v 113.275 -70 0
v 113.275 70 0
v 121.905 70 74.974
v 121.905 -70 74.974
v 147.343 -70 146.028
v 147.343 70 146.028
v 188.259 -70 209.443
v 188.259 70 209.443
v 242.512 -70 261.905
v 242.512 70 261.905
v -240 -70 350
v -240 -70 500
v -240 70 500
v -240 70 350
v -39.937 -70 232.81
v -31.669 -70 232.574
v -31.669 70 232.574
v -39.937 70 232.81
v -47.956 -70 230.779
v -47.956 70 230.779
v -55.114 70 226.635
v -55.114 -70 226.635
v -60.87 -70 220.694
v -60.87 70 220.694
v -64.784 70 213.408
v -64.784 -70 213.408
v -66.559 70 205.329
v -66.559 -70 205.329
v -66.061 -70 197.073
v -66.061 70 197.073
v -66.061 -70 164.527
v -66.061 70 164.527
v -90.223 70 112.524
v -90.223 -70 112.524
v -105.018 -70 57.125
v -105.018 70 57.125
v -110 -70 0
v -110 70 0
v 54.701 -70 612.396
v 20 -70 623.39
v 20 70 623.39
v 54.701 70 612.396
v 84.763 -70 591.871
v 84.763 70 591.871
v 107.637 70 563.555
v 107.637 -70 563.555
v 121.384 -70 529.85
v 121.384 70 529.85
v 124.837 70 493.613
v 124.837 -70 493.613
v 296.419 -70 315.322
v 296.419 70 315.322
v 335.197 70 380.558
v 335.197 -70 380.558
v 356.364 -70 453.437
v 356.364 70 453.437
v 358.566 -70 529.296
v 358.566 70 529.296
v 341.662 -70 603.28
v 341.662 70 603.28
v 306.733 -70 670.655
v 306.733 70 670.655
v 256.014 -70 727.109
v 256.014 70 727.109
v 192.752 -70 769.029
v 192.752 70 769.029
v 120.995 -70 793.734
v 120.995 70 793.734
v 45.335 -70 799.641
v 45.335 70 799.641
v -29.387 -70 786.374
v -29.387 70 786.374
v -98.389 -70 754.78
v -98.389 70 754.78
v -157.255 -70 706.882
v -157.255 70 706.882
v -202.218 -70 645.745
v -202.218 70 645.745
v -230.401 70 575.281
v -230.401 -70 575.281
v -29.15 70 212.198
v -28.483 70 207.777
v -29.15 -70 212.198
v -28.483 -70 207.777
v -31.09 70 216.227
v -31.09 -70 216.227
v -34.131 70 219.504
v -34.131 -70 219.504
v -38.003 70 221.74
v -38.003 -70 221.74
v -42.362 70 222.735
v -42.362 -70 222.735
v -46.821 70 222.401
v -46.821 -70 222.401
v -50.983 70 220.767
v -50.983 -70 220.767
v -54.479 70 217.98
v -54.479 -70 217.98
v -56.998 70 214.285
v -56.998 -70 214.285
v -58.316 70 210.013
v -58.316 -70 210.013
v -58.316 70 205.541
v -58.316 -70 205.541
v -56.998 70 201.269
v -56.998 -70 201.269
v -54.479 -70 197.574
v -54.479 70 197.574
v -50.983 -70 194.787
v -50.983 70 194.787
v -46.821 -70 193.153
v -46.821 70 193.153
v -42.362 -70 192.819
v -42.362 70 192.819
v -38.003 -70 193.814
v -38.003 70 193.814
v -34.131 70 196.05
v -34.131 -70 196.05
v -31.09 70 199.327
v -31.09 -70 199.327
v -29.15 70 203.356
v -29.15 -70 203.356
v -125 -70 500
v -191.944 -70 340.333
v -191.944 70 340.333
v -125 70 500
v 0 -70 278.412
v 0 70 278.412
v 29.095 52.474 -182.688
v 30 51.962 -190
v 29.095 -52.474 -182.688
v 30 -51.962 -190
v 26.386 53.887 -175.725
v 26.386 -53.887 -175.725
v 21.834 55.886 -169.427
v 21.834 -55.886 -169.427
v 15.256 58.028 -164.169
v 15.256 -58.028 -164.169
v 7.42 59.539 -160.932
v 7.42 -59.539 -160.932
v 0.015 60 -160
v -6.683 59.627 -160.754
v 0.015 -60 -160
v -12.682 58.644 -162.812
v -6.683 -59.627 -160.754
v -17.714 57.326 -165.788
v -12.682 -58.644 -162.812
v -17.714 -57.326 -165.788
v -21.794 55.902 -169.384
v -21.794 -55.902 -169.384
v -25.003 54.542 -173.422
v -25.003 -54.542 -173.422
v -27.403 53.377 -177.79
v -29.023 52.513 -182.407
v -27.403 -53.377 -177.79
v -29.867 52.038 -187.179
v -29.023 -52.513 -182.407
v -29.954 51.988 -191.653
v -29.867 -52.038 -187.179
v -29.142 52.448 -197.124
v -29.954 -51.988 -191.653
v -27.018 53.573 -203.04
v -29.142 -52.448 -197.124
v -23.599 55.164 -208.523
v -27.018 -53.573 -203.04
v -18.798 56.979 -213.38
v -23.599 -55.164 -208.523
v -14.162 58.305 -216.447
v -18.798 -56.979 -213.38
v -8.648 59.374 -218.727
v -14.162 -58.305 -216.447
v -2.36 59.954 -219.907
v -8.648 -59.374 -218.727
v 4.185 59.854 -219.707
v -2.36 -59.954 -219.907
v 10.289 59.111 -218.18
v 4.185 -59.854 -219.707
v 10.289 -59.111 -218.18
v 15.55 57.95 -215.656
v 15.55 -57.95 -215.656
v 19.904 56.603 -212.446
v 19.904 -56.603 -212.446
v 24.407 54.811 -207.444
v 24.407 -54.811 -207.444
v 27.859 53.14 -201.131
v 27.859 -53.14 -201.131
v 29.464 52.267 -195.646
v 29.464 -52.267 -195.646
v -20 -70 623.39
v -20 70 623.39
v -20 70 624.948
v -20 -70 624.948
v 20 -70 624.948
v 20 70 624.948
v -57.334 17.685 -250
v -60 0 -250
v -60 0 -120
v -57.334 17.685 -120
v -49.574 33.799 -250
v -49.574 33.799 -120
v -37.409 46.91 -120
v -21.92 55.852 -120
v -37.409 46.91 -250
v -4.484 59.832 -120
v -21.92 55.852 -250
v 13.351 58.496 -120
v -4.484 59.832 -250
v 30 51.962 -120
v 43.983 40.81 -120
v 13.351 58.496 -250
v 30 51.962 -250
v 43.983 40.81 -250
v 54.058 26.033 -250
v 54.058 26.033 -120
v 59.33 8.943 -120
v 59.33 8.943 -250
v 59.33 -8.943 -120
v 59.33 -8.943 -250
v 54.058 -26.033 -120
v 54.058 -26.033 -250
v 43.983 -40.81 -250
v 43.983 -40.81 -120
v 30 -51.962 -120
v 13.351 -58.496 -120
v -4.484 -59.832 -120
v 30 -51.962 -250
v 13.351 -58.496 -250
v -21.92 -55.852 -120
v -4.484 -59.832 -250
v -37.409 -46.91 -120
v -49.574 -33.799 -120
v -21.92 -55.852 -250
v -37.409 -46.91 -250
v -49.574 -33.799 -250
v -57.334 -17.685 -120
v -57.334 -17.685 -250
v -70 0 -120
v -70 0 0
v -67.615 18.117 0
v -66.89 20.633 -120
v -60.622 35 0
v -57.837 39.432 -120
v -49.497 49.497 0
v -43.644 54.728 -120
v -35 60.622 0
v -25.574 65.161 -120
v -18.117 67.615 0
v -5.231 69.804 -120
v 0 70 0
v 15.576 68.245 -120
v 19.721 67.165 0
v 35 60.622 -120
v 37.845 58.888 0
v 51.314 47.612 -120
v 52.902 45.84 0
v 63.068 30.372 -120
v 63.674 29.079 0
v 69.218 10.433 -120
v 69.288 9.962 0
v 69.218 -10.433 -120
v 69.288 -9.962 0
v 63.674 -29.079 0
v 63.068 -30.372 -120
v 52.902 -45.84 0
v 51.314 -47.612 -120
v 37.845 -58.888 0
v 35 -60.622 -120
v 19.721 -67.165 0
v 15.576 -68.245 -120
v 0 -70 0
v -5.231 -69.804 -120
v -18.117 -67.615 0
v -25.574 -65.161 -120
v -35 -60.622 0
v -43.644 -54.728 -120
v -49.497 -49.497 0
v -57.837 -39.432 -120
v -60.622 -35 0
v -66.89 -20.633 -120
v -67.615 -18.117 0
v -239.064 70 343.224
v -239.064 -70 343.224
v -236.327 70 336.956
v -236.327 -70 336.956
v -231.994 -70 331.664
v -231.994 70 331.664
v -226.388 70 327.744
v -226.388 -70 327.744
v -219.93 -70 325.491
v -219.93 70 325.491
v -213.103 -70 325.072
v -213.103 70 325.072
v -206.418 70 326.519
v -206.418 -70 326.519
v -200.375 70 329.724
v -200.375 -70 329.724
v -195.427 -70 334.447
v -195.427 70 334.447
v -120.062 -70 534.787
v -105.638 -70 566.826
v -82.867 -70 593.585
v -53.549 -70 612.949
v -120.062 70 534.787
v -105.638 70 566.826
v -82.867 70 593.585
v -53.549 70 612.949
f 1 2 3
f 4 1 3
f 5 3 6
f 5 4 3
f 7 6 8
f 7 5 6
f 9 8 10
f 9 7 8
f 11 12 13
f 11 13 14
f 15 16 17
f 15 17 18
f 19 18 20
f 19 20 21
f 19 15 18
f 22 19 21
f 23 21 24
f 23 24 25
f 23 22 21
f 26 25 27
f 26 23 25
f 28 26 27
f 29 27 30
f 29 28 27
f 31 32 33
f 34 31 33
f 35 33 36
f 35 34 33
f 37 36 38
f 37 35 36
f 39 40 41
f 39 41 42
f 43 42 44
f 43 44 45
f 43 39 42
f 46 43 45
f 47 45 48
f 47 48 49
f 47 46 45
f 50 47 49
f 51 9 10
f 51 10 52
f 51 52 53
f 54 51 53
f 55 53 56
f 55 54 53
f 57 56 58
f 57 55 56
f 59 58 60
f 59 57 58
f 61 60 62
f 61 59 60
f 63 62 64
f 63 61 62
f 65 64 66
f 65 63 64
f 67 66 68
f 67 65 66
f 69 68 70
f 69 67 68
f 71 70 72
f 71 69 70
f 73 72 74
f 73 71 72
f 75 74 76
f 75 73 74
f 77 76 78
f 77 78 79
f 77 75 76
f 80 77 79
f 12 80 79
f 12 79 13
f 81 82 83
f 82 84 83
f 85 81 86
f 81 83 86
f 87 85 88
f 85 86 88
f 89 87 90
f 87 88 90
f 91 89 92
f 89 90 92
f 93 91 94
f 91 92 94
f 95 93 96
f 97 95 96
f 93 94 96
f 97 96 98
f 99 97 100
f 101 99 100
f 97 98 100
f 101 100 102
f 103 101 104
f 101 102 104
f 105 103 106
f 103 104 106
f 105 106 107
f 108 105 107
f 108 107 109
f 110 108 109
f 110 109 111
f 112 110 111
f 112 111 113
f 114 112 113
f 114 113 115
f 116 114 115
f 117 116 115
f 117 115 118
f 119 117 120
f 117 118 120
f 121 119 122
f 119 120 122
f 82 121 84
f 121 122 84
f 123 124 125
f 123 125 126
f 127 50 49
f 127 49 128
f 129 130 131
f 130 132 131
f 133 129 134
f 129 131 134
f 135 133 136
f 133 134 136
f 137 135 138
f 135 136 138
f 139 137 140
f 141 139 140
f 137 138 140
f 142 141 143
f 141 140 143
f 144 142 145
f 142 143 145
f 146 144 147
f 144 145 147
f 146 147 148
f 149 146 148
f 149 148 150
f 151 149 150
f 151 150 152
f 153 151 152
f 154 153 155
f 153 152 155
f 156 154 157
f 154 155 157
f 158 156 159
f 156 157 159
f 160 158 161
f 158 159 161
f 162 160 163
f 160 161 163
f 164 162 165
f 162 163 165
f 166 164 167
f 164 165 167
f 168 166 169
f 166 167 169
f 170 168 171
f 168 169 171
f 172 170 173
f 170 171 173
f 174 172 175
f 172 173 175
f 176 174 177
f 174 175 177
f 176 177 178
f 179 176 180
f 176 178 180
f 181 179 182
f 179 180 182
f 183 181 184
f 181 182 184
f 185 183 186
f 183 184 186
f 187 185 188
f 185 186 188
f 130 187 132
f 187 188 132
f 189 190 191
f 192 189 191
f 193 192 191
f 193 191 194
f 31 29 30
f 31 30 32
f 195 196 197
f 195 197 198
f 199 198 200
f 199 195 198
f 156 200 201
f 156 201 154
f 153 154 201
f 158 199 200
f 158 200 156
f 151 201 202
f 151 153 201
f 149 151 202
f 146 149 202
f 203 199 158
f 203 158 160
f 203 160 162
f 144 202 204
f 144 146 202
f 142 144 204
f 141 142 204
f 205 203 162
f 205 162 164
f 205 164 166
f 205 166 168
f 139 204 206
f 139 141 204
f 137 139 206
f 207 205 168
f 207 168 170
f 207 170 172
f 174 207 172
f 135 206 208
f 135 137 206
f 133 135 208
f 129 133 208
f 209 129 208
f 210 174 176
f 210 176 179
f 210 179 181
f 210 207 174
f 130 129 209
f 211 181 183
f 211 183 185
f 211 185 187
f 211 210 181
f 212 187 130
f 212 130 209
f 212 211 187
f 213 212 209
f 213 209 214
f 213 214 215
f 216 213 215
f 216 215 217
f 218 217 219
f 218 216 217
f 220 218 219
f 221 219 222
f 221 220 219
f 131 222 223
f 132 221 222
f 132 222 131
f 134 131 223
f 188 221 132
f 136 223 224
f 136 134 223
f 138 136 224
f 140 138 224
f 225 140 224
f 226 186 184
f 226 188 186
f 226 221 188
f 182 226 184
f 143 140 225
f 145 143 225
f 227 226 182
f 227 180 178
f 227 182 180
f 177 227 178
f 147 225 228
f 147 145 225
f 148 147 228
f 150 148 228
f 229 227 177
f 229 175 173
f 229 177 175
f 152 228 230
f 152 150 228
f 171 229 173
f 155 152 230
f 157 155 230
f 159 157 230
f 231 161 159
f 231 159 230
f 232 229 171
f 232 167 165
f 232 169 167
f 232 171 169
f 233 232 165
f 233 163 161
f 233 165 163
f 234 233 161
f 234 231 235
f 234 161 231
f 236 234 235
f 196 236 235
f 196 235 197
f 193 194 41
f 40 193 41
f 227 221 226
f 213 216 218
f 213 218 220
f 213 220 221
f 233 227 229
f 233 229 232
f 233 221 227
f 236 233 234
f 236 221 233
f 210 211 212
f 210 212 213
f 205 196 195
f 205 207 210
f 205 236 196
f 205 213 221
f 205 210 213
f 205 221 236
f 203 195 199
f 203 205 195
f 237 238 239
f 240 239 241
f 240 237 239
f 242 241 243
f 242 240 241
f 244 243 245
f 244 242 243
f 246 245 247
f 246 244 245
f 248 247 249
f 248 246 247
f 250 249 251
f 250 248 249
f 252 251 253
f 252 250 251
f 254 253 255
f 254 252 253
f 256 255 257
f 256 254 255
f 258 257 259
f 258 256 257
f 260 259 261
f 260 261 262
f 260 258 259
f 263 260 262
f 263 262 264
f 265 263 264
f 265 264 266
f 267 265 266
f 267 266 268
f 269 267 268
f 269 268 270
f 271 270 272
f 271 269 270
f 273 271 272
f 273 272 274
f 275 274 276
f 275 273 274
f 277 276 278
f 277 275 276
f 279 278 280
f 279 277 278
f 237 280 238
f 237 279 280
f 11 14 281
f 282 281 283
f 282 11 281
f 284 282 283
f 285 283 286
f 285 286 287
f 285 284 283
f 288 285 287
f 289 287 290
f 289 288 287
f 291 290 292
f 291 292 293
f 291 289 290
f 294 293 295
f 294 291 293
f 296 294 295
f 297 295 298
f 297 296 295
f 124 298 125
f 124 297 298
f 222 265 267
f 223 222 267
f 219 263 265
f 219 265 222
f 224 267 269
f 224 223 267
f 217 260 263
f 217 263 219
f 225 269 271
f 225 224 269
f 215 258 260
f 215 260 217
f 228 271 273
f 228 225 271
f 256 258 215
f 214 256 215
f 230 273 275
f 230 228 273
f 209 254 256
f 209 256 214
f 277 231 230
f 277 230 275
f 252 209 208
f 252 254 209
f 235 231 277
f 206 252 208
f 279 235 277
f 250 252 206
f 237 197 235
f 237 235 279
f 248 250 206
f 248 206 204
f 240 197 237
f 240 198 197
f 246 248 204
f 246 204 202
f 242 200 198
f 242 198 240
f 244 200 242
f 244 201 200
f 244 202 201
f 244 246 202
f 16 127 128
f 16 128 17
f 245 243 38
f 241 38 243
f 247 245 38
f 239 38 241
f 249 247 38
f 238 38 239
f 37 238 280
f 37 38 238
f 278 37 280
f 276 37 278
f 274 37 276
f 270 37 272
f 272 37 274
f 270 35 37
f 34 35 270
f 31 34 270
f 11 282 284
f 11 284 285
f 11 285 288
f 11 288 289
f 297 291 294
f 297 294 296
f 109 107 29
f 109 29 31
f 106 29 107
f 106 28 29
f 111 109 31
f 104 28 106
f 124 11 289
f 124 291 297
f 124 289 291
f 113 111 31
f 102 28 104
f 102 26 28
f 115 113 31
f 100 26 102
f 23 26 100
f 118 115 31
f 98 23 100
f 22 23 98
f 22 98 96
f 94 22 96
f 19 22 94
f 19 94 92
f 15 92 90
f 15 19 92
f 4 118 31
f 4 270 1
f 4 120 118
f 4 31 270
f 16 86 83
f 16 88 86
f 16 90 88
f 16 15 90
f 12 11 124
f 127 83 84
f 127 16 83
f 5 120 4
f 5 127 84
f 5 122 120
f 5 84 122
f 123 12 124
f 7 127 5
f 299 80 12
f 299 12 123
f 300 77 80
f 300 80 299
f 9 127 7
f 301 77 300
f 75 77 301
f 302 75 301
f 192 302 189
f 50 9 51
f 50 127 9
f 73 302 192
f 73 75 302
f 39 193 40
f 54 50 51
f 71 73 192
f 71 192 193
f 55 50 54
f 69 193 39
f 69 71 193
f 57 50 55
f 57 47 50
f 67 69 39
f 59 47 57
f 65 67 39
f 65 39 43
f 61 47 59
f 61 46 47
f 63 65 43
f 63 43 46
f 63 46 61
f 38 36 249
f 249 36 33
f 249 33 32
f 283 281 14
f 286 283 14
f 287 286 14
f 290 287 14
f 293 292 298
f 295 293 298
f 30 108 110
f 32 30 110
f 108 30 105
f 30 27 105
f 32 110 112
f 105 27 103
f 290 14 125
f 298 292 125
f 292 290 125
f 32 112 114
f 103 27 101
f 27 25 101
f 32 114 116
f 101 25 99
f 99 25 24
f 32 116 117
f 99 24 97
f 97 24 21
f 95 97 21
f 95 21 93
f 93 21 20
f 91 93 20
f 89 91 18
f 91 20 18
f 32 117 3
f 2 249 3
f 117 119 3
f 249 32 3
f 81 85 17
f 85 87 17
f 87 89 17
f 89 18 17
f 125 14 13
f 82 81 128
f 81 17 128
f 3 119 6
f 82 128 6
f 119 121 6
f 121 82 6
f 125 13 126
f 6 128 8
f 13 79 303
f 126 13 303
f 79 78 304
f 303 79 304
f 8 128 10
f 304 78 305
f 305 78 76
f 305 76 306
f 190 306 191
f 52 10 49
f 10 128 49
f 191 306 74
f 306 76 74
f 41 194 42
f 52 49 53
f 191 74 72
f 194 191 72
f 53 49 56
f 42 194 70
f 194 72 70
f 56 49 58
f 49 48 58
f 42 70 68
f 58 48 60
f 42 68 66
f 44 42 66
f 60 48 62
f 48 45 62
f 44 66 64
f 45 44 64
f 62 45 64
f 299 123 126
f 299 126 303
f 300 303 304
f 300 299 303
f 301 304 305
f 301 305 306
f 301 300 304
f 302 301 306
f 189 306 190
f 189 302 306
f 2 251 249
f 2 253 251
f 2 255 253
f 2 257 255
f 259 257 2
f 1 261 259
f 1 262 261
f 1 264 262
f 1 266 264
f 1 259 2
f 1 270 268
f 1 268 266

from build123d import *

# Parameters (mm, degrees)
F3_DEPTH = 70
F4_R     = 30
F5_DEPTH = 112
F6_R     = 15
F7_DEPTH = 163


with BuildPart() as f2:
    # F1 (on Front) → F2 (revolve)
    with BuildSketch(Plane.XZ):
        Polygon((-60, -120), (-60, -250), (0, -250), (0, 0), (-70, 0), (-70, -120), align=None)
    revolve(axis=Axis((0, 0, -125), (0, 0, -1)))

    # F0 (on Front) → F3 (join, symmetric)
    with BuildSketch(Plane.XZ):
        with BuildLine():
            ThreePointArc((113.275358, 0), (147.343032, 146.027594), (242.512075, 261.904762))
            ThreePointArc((242.512075, 261.904762), (192.752359, 769.029387), (-240, 500))
            Line((-240, 500), (-125, 500))
            ThreePointArc((-125, 500), (-95.197164, 581.009259), (-20, 623.389627))
            Line((-20, 623.389627), (-20, 624.947867))
            Line((-20, 624.947867), (20, 624.947867))
            Line((20, 624.947867), (20, 623.389627))
            ThreePointArc((20, 623.389627), (97.236318, 578.549974), (124.836727, 493.613169))
            Line((124.836727, 493.613169), (0, 278.411619))
            Line((0, 278.411619), (-31.669397, 232.573897))
            ThreePointArc((-31.669397, 232.573897), (-58.197727, 223.86417), (-66.061109, 197.072774))
            Line((-66.061109, 197.072774), (-66.061109, 164.52672))
            ThreePointArc((-66.061109, 164.52672), (-98.826102, 85.146444), (-110, 0))
            Line((-110, 0), (113.275358, 0))
        make_face()
        with BuildLine():
            Line((-125, 500), (-240, 500))
            Line((-240, 500), (-240, 350))
            ThreePointArc((-240, 350), (-219.930134, 325.490945), (-191.944498, 340.333365))
            Line((-191.944498, 340.333365), (-125, 500))
        make_face()
    extrude(amount=F3_DEPTH, both=True)

    # F4 (on Front) → F5 (cut, symmetric)
    with BuildSketch(Plane.XZ):
        with Locations((0, -190)):
            Circle(F4_R)
    extrude(amount=F5_DEPTH, both=True, mode=Mode.SUBTRACT)

    # F6 (on face) → F7 (cut, symmetric)
    with BuildSketch(Plane.XZ.offset(70)):
        with Locations((-43.483209, 207.776994)):
            Circle(F6_R)
    extrude(amount=F7_DEPTH, both=True, mode=Mode.SUBTRACT)


solid = f2.part
